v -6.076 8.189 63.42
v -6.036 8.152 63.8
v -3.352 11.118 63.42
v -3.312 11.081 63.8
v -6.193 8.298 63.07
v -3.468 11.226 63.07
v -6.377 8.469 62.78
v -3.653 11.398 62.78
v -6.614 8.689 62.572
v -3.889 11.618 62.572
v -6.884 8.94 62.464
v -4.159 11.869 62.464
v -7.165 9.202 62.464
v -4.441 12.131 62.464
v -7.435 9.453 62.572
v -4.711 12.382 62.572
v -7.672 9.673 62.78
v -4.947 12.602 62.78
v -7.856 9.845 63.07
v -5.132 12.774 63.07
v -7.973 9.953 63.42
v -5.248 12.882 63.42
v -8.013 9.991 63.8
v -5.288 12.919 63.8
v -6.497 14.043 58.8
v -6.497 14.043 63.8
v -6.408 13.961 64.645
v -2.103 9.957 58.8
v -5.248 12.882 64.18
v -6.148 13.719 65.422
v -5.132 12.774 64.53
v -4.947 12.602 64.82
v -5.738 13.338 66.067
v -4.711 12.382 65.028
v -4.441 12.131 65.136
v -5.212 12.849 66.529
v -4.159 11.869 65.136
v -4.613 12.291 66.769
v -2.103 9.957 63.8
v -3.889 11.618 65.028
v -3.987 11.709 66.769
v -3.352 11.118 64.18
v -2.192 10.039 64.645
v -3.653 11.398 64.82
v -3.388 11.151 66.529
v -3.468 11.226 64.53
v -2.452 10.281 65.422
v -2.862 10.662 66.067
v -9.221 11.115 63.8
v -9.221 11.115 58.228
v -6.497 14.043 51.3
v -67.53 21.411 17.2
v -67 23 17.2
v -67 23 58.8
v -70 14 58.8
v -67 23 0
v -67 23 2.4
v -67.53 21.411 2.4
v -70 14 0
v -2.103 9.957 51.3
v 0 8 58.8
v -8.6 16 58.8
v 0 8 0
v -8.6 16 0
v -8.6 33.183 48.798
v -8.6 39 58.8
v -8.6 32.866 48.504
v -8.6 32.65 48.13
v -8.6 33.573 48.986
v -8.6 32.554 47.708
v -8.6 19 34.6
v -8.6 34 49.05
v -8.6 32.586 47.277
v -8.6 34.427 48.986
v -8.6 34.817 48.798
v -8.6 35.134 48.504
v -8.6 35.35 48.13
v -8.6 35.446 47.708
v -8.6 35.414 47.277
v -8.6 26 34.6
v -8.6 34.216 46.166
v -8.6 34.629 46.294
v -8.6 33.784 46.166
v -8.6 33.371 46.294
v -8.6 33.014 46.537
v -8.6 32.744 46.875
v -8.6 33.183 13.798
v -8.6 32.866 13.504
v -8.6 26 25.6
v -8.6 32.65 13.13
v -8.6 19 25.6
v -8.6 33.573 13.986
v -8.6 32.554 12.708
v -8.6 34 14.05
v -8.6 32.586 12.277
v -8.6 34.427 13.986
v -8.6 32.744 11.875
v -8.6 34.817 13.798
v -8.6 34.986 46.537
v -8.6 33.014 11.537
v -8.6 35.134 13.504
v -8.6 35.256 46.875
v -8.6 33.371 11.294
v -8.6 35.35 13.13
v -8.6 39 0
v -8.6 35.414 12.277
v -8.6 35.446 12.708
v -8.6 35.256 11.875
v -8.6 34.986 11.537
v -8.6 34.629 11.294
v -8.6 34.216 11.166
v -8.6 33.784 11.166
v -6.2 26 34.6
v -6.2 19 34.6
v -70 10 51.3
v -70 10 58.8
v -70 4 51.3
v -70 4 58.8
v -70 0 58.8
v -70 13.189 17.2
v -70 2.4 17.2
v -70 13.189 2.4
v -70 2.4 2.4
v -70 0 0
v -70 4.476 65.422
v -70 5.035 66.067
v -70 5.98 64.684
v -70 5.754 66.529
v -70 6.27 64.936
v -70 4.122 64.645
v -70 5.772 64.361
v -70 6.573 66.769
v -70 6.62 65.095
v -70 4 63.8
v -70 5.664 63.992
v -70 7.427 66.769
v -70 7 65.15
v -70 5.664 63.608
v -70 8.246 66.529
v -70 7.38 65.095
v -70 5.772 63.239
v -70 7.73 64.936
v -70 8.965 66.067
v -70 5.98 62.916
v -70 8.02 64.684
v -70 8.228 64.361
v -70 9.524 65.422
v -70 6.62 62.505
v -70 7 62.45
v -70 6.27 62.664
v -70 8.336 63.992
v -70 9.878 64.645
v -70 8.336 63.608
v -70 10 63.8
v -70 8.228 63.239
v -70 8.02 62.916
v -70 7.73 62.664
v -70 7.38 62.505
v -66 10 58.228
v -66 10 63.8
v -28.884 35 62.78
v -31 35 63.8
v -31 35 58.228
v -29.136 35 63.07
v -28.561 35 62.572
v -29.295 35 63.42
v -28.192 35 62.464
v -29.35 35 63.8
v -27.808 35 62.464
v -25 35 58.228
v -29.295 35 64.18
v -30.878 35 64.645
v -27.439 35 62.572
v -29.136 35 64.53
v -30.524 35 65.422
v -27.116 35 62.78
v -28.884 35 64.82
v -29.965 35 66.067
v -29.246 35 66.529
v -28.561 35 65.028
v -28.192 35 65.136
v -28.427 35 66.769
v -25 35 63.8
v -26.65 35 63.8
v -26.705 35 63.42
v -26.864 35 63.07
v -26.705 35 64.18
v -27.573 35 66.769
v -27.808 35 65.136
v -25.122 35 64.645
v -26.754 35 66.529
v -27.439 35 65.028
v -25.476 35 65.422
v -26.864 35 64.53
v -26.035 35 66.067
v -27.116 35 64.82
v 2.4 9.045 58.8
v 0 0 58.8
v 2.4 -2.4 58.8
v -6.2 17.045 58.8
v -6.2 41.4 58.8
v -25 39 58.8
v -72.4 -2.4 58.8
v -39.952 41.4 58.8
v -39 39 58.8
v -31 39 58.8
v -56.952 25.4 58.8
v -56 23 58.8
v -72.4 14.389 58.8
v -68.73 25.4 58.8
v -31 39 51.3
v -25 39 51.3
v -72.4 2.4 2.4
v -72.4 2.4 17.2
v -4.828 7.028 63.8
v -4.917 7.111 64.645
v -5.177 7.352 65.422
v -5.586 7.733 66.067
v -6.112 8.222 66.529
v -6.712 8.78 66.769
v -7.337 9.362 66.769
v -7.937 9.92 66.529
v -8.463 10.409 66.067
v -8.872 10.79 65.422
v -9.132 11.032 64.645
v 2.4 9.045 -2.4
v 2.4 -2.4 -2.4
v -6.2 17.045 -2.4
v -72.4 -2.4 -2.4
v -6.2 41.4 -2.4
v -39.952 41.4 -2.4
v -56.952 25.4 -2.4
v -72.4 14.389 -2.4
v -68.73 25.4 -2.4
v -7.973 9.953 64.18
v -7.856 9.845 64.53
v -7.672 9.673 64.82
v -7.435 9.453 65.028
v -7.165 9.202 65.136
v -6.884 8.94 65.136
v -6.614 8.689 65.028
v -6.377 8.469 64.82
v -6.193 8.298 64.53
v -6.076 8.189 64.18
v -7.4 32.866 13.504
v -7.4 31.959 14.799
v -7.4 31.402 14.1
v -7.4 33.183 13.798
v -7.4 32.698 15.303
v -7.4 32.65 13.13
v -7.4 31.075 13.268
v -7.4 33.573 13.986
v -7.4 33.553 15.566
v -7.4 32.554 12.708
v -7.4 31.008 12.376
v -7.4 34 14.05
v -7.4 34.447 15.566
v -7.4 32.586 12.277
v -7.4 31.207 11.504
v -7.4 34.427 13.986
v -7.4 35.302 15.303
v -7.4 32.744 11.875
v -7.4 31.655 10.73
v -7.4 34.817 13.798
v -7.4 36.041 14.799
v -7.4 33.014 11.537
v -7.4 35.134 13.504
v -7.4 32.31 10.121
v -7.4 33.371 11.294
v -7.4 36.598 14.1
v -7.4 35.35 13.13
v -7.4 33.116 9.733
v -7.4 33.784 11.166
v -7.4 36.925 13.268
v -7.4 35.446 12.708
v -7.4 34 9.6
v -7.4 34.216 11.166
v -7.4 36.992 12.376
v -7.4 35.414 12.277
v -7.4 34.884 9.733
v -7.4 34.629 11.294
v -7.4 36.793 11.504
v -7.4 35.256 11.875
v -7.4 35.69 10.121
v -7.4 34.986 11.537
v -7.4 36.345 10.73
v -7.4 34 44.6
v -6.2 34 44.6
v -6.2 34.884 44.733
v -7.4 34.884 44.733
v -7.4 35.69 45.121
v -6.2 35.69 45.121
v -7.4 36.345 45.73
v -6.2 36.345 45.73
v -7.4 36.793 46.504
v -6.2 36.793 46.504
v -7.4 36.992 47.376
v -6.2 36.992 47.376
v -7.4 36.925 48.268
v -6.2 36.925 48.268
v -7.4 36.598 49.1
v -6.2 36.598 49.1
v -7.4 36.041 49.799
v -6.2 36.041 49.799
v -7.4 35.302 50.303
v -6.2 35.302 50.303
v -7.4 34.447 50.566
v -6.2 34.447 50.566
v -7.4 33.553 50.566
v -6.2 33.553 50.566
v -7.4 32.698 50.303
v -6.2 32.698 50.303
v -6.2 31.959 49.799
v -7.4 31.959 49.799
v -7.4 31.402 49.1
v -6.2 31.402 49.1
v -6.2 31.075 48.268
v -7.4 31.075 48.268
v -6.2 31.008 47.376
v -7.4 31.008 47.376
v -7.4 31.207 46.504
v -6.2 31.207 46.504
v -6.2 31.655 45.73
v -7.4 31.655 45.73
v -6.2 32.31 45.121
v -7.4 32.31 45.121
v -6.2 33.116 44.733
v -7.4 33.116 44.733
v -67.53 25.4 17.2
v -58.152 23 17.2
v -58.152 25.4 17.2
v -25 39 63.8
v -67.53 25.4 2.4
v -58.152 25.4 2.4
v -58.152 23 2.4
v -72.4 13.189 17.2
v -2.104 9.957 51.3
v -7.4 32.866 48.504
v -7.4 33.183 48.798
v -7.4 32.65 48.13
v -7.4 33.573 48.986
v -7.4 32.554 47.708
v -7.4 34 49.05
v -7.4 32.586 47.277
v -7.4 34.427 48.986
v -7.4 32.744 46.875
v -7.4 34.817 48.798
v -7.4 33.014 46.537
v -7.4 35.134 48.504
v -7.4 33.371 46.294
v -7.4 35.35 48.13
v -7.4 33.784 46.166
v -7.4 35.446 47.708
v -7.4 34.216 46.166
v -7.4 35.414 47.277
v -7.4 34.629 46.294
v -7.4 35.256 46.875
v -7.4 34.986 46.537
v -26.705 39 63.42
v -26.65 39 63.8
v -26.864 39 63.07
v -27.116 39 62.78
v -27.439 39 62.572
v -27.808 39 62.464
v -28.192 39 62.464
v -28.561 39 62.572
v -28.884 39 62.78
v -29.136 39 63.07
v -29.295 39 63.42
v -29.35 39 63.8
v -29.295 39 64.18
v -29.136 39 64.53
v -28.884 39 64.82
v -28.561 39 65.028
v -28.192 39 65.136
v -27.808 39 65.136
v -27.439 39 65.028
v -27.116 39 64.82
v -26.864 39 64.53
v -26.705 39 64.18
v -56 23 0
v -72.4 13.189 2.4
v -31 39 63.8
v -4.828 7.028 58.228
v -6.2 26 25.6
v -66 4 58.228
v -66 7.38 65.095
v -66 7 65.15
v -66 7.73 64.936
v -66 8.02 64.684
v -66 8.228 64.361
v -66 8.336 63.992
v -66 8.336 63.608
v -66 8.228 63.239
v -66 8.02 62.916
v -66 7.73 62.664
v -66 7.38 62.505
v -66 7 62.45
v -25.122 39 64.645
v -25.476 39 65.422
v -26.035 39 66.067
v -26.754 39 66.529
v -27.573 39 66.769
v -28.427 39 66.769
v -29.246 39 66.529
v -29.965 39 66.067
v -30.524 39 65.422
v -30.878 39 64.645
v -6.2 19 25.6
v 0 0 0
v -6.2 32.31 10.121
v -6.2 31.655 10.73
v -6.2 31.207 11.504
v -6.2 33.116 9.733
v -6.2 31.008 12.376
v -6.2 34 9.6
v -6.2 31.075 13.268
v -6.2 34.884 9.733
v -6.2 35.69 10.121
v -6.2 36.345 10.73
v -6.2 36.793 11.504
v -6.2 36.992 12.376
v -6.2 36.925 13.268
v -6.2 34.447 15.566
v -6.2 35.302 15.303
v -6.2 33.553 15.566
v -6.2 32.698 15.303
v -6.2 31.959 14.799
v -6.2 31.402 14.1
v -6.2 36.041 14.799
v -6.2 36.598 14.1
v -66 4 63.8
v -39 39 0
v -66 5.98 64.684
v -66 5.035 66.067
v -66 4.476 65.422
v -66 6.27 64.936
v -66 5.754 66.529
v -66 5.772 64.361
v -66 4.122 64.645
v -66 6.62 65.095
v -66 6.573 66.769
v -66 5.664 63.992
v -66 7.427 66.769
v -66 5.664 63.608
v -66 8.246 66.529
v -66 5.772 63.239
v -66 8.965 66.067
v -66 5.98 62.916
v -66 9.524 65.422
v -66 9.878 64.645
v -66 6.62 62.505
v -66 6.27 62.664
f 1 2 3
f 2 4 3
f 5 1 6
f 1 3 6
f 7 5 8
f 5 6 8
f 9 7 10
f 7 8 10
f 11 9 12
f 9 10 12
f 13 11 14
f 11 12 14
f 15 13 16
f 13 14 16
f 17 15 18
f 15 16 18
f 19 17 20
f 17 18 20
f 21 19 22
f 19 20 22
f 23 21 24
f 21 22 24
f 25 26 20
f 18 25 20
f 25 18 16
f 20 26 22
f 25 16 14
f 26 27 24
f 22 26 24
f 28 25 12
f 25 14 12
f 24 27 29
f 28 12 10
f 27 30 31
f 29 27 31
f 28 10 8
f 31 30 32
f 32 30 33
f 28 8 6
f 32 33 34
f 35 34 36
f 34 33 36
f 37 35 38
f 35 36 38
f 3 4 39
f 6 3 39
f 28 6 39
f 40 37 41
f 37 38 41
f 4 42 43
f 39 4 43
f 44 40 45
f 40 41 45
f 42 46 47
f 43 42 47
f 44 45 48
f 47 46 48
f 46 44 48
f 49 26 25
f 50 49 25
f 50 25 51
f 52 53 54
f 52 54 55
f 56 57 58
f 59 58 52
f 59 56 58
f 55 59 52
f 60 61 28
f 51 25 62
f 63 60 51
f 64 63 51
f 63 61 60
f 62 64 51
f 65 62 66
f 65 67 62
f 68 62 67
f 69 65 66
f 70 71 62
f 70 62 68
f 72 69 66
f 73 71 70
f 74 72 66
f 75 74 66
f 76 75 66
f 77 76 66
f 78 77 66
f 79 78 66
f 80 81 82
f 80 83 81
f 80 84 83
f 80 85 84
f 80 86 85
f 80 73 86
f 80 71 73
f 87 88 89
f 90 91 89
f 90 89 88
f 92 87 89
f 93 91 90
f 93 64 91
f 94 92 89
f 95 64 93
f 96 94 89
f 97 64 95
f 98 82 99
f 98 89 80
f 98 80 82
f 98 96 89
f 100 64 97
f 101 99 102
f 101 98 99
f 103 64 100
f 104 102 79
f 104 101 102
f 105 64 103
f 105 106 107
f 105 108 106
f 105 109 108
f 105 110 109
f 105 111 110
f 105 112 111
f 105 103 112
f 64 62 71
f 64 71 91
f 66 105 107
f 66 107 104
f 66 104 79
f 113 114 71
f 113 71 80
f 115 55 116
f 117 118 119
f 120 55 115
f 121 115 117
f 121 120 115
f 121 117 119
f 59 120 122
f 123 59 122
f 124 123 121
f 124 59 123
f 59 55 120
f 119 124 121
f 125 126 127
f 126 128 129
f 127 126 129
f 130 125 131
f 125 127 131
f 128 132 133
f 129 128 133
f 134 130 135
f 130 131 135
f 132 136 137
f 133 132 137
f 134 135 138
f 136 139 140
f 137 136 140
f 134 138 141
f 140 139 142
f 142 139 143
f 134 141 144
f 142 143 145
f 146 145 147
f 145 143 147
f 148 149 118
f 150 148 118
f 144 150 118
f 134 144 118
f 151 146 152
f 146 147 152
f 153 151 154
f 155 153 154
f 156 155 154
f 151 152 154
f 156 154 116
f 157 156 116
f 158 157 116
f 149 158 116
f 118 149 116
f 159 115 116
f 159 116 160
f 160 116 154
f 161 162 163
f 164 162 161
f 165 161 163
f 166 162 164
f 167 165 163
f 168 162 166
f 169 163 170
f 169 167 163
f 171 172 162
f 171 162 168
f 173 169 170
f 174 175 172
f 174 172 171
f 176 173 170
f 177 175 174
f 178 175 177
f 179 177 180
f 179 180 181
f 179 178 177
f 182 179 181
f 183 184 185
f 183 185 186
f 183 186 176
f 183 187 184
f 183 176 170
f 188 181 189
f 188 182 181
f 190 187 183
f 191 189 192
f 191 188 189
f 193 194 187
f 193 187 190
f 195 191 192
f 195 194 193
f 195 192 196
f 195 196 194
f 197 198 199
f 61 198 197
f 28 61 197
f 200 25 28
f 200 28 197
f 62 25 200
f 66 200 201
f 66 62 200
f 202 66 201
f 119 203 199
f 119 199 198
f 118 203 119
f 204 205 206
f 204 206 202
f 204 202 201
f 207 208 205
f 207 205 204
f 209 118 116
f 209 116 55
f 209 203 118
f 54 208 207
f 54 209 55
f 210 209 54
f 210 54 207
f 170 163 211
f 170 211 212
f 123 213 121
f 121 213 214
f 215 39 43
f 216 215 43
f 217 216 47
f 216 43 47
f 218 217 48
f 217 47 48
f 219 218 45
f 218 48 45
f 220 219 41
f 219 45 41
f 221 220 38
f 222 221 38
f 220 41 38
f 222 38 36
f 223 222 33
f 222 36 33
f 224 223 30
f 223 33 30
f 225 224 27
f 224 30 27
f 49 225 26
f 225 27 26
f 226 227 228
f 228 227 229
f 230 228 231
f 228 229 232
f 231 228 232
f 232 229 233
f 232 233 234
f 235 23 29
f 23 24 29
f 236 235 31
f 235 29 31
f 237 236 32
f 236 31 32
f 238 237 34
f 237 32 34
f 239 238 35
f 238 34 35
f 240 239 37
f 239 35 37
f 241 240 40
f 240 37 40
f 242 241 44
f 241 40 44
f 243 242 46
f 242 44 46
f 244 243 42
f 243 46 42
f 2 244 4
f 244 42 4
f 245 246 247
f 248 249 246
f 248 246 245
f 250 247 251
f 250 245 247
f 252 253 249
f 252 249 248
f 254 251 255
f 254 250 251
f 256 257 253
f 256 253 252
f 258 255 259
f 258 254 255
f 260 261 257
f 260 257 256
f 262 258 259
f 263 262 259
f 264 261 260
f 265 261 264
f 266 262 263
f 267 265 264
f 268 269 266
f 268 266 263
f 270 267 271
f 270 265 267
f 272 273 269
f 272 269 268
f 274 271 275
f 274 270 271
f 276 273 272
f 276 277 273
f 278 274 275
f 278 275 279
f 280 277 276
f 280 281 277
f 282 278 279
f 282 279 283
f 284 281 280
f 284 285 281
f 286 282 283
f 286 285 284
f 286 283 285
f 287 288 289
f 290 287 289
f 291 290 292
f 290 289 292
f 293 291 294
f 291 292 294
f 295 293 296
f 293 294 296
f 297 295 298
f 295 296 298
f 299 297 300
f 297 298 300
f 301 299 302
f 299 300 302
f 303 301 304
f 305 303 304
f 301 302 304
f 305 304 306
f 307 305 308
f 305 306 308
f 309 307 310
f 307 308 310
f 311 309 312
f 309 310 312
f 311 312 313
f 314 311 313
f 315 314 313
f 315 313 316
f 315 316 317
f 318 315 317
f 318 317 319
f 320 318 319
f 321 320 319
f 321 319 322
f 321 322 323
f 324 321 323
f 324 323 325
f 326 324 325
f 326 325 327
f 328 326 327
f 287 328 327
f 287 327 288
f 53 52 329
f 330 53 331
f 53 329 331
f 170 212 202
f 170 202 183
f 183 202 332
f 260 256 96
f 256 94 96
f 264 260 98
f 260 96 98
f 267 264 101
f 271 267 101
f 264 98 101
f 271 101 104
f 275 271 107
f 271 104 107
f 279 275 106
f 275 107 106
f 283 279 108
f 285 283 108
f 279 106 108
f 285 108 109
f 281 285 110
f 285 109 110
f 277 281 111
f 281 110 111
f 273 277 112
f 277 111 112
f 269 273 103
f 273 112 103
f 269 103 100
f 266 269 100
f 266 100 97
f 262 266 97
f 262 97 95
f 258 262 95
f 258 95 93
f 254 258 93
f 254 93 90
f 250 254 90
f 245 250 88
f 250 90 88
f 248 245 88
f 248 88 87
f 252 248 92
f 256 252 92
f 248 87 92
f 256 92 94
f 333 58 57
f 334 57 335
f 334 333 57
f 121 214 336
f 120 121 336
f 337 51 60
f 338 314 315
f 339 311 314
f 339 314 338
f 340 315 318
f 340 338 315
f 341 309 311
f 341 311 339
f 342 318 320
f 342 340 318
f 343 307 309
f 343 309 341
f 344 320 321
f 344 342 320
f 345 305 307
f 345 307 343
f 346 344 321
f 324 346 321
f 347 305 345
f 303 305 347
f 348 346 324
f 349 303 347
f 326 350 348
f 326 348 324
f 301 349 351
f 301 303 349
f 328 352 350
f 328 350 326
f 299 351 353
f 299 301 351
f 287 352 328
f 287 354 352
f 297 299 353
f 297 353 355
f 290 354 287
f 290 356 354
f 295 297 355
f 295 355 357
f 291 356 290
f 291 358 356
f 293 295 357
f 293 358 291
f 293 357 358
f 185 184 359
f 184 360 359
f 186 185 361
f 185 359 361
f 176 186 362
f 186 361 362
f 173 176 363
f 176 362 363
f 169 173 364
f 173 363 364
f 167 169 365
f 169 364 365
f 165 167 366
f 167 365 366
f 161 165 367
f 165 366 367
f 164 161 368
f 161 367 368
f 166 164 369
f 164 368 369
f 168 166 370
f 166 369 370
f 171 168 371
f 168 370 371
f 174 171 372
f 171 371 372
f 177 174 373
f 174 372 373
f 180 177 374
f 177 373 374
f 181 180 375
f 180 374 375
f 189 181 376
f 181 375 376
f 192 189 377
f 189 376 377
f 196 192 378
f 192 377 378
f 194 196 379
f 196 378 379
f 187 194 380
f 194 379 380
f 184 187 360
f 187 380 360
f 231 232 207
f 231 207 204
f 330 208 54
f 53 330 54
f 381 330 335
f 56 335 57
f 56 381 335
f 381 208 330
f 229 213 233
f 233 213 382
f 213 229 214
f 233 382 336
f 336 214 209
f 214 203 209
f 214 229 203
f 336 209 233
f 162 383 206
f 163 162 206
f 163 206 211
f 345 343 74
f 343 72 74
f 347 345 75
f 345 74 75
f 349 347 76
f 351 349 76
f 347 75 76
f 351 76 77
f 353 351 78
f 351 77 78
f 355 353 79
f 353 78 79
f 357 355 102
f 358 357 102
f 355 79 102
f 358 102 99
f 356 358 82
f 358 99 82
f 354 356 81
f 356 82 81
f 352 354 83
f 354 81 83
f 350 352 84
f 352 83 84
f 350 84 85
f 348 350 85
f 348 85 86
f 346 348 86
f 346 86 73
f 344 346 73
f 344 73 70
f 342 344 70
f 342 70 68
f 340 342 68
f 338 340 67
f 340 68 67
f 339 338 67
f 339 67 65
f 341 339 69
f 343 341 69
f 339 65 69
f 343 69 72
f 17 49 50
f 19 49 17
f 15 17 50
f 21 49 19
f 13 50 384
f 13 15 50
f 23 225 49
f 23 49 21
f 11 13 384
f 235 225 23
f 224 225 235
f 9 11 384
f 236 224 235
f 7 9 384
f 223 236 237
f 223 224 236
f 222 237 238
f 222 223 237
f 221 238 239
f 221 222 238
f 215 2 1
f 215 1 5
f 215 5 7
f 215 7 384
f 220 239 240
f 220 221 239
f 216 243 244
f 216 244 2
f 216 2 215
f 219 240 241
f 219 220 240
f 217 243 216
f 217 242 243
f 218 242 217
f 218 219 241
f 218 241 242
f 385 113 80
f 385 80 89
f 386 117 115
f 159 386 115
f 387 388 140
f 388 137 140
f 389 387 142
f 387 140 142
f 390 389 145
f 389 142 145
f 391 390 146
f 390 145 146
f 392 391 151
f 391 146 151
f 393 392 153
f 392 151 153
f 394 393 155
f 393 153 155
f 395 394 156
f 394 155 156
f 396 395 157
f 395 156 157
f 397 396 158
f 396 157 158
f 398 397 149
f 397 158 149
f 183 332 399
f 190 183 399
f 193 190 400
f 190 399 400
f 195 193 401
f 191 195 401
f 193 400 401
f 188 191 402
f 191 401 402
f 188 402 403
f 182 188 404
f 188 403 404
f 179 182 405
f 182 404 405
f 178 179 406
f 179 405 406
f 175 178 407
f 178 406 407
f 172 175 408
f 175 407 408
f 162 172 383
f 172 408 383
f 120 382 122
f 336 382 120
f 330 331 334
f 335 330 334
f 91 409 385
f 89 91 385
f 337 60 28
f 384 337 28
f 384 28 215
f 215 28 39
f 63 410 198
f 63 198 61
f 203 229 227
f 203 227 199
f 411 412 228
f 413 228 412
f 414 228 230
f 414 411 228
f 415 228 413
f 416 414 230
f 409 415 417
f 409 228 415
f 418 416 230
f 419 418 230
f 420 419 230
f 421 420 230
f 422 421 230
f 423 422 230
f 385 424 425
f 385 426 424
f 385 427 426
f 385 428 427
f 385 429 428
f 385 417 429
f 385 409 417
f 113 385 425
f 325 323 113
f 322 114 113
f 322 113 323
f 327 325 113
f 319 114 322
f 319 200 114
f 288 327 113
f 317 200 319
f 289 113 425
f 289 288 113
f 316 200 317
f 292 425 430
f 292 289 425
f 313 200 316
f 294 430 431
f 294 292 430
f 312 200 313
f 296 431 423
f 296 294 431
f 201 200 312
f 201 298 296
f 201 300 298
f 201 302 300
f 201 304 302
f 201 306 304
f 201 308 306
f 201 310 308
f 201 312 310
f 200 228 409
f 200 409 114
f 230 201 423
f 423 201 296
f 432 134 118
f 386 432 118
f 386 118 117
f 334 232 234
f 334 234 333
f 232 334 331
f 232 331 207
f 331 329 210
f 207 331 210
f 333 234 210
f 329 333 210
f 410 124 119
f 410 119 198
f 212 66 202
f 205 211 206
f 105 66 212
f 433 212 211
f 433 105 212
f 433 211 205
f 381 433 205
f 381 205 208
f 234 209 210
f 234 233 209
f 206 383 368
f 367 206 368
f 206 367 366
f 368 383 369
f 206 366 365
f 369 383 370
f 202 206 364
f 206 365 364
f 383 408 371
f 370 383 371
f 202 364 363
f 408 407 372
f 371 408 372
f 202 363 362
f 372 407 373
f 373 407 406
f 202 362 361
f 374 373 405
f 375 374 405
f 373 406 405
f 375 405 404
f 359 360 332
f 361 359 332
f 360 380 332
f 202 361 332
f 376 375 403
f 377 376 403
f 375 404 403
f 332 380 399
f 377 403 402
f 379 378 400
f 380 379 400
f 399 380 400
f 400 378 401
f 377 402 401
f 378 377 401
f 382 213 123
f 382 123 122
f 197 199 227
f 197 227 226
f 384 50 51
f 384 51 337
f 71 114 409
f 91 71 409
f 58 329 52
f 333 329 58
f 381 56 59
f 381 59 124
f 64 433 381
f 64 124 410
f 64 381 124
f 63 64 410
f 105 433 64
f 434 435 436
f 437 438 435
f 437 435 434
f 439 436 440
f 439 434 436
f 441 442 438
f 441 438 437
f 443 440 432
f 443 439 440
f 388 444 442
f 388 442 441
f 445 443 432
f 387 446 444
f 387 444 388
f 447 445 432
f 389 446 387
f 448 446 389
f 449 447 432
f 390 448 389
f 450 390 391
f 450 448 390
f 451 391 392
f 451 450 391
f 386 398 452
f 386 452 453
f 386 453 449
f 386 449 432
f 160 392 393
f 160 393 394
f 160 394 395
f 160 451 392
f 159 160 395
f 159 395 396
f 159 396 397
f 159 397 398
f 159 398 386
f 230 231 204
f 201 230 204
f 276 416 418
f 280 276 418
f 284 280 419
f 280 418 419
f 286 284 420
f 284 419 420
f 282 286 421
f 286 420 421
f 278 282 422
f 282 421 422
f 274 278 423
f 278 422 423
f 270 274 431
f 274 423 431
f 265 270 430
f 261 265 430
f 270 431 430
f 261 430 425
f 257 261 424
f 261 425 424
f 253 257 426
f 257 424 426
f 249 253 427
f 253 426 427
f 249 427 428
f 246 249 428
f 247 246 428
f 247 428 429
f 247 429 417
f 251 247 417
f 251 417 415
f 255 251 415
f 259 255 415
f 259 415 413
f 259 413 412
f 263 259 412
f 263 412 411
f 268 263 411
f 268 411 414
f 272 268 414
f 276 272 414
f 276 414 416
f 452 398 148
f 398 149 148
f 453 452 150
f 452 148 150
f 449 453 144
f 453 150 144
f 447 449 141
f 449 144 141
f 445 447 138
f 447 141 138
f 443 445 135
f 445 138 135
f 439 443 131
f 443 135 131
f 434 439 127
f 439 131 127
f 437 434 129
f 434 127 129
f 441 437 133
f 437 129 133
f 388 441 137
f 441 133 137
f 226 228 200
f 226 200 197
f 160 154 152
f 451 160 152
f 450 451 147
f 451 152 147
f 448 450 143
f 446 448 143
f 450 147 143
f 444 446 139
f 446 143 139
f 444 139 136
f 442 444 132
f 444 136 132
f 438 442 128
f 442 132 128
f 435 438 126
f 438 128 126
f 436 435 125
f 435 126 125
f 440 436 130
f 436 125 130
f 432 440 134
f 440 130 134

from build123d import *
from OCP.BRepFilletAPI import BRepFilletAPI_MakeChamfer

# Parameters (mm, degrees)
BOSS_EXTRUDE1_DEPTH                                = 104
SHELL1_START                                       = -8.6
SHELL1_OUTLINE_W                                   = 16
SHELL1_OUTLINE_H                                   = 108.8
SHELL1_DEPTH                                       = 2.4
SHELL1_START_2                                     = -56.951785259
SHELL1_2_OUTLINE_W                                 = 43.8
SHELL1_2_OUTLINE_H                                 = 108.8
SHELL1_2_DEPTH                                     = 50.751785259
SHELL1_START_3                                     = -72.4
SHELL1_3_OUTLINE_W                                 = 27.8
SHELL1_3_OUTLINE_H                                 = 108.8
SHELL1_3_DEPTH                                     = 74.8
SHELL1_4_DEPTH                                     = 104
SHELL1_START_4                                     = -2.4
SHELL1_5_DEPTH                                     = 108.8
SPLIT1_SURFACE_1_BACK                              = 140.108
SPLIT1_SURFACE_1_DEPTH                             = 280.216
SPLIT1_SURFACE_2_BACK                              = 140.108
SPLIT1_SURFACE_2_DEPTH                             = 280.216
BOSS_EXTRUDE2_DEPTH                                = 4
BOSS_EXTRUDE3_DEPTH                                = 4
BOSS_EXTRUDE4_DEPTH                                = 4
CHAMFER1_SIZE                                      = 4
CHAMFER1_SIZE_2                                    = 6.92820323
CBORE_START                                        = 6.157493905
CBORE_FOR_M2_5_PAN_HEAD_MACHINE_SCRE_2_R           = 3
CBORE_FOR_M2_5_PAN_HEAD_MACHINE_SCREW1_4_DEPTH     = 2.1
CBORE_START_2                                      = 5.857493905
CBORE_FOR_M2_5_PAN_HEAD_MACHINE_SCRE_3_R           = 1.35
CBORE_FOR_M2_5_PAN_HEAD_MACHINE_SCREW1_5_DEPTH     = 0.3
CBORE_START_3                                      = 39.3
CBORE_FOR_M2_5_PAN_HEAD_MACHINE_SCRE_4_R           = 3
CBORE_FOR_M2_5_PAN_HEAD_MACHINE_SCREW1_6_DEPTH     = 2.1
CBORE_START_4                                      = 38
CBORE_FOR_M2_5_PAN_HEAD_MACHINE_SCRE_5_R           = 1.35
CBORE_FOR_M2_5_PAN_HEAD_MACHINE_SCREW1_7_DEPTH     = 1.3
CBORE_START_5                                      = -72.4
CBORE_FOR_M2_5_PAN_HEAD_MACHINE_SCRE_6_R           = 3
CBORE_FOR_M2_5_PAN_HEAD_MACHINE_SCREW1_8_DEPTH     = 2.1
CBORE_START_6                                      = -70.3
CBORE_FOR_M2_5_PAN_HEAD_MACHINE_SCRE_7_R           = 1.35
CBORE_FOR_M2_5_PAN_HEAD_MACHINE_SCREW1_9_DEPTH     = 0.3
CUT_EXTRUDE1_REACH                                 = 104.356
SKETCH12_W                                         = 9.37803524
SKETCH12_H                                         = 14.8
CUT_EXTRUDE2_REACH                                 = 110.495
SKETCH13_W                                         = 14.8
SKETCH13_H                                         = 10.789494281
CUT_EXTRUDE3_REACH                                 = 104.755
SKETCH14_W                                         = 9
SKETCH14_H                                         = 7
CBORE_FOR_M2_5_PAN_HEAD_MACHINE_SCREW2_D           = 2.9
CBORE_FOR_M2_5_PAN_HEAD_MACHINE_SCREW2_DEPTH       = 10
CBORE_FOR_M2_5_PAN_HEAD_MACHINE_SCREW2_CBORE_D     = 6
CBORE_FOR_M2_5_PAN_HEAD_MACHINE_SCREW2_CBORE_DEPTH = 1.2


with BuildPart() as part:
    # Sketch1 → Boss-Extrude1 (new body)
    with BuildSketch(Plane.XY):
        Polygon((-39, 39), (-56, 23), (-67, 23), (-70, 14.000026796), (-70, 0), (0, 0), (0, 8), (-8.6, 16), (-8.6, 39), align=None)
    extrude(amount=BOSS_EXTRUDE1_DEPTH)

    # Shell1: read off the stored shape, not the designer's step
    # Shell1 outline → Shell1 (add)
    with BuildSketch(Plane.YZ.offset(SHELL1_START)):
        with Locations((33.4, 52)):
            Rectangle(SHELL1_OUTLINE_W, SHELL1_OUTLINE_H)
    extrude(amount=SHELL1_DEPTH)

    # Shell1 2 outline → Shell1 2 (add)
    with BuildSketch(Plane.YZ.offset(SHELL1_START_2)):
        with Locations((19.5, 52)):
            Rectangle(SHELL1_2_OUTLINE_W, SHELL1_2_OUTLINE_H)
    extrude(amount=SHELL1_2_DEPTH)

    # Shell1 3 outline → Shell1 3 (add)
    with BuildSketch(Plane.YZ.offset(SHELL1_START_3)):
        with Locations((11.5, 52)):
            Rectangle(SHELL1_3_OUTLINE_W, SHELL1_3_OUTLINE_H)
    extrude(amount=SHELL1_3_DEPTH)

    # Shell1 4 outline → Shell1 4 (cut)
    with BuildSketch(Plane.XY):
        Polygon((-6.2, 25.4), (-6.2, 17.045294183), (2.4, 9.045294183), (2.4, 25.4), align=None)
        Polygon((-72.4, 14.389494281), (-68.729820499, 25.4), (-72.4, 25.4), align=None)
        Polygon((-56.951785259, 25.4), (-39.951785259, 41.4), (-56.951785259, 41.4), align=None)
        Polygon((0, 0), (0, 8), (-8.6, 16), (-8.6, 39), (-39, 39), (-56, 23), (-67, 23), (-70, 14.000026796), (-70, 0), align=None)
    extrude(amount=SHELL1_4_DEPTH, mode=Mode.SUBTRACT)

    # Shell1 5 outline → Shell1 5 (cut)
    with BuildSketch(Plane.XY.offset(SHELL1_START_4)):
        Polygon((-6.2, 25.4), (-6.2, 17.045294183), (2.4, 9.045294183), (2.4, 25.4), align=None)
        Polygon((-72.4, 14.389494281), (-68.729820499, 25.4), (-72.4, 25.4), align=None)
        Polygon((-56.951785259, 25.4), (-39.951785259, 41.4), (-56.951785259, 41.4), align=None)
    extrude(amount=SHELL1_5_DEPTH, mode=Mode.SUBTRACT)


with BuildPart() as body_2:
    # Split1: the piece behind the surface
    add(part.part)
    # Split1 surface: a surface, the sketch's curves swept straight by 280.216 mm
    with BuildLine(Plane(origin=(0, 0, 0), x_dir=(0, 0, -1), z_dir=(1, 0, 0)).offset(-SPLIT1_SURFACE_1_BACK), mode=Mode.PRIVATE) as split1_surface_1_path:
        Line((-58.8, -2.4), (-58.8, 41.4))
    split1_surface_1 = Shell.extrude(split1_surface_1_path.wire(), (1 * SPLIT1_SURFACE_1_DEPTH, 0 * SPLIT1_SURFACE_1_DEPTH, 0 * SPLIT1_SURFACE_1_DEPTH))
    split(bisect_by=split1_surface_1, keep=Keep.BOTTOM)

    # Sketch3 → Boss-Extrude2 (add)
    with BuildSketch(Plane(origin=(3.989562192, 4.288779356, 0), x_dir=(0.7321867381630838, -0.6811039424772873, 0), z_dir=(-0.6811039424772873, -0.7321867381630838, 0))):
        with BuildLine():
            Line((-14.321650284, 51.3), (-8.321650284, 51.3))
            Line((-8.321650284, 51.3), (-8.321650284, 63.8))
            ThreePointArc((-8.321650284, 63.8), (-11.321650284, 66.8), (-14.321650284, 63.8))
            Line((-14.321650284, 63.8), (-14.321650284, 51.3))
        make_face()
    extrude(amount=BOSS_EXTRUDE2_DEPTH)

    # Sketch4 → Boss-Extrude3 (add)
    with BuildSketch(Plane.XZ.offset(-39)):
        with BuildLine():
            Line((-31, 51.3), (-25, 51.3))
            Line((-25, 51.3), (-25, 63.8))
            ThreePointArc((-25, 63.8), (-28, 66.8), (-31, 63.8))
            Line((-31, 63.8), (-31, 51.3))
        make_face()
    extrude(amount=BOSS_EXTRUDE3_DEPTH)

    # Sketch5 → Boss-Extrude4 (add)
    with BuildSketch(Plane(origin=(-70, 0, 0), x_dir=(0, 0, -1), z_dir=(1, 0, 0))):
        with BuildLine():
            Line((-51.3, 10.000013398), (-63.8, 10.000013398))
            ThreePointArc((-63.8, 10.000013398), (-66.8, 7.000013398), (-63.8, 4.000013398))
            Line((-63.8, 4.000013398), (-51.3, 4.000013398))
            Line((-51.3, 4.000013398), (-51.3, 10.000013398))
        make_face()
    extrude(amount=BOSS_EXTRUDE4_DEPTH)

    # Chamfer1
    chamfer1_edges_1 = [body_2.edges().sort_by_distance(p)[0] for p in [
        (-7.02441577, 9.071253047, 51.3),
    ]]
    chamfer1_side_1 = [body_2.faces().sort_by_distance(p)[0] for p in [
        (-6.969927455, 9.129827986, 51.3),
    ]]
    chamfer1_edges_2 = [body_2.edges().sort_by_distance(p)[0] for p in [
        (-28, 35, 51.3),
    ]]
    chamfer1_side_2 = [body_2.faces().sort_by_distance(p)[0] for p in [
        (-28, 35.08, 51.3),
    ]]
    chamfer1_edges_3 = [body_2.edges().sort_by_distance(p)[0] for p in [
        (-66, 7.000013398, 51.3),
    ]]
    chamfer1_side_3 = [body_2.faces().sort_by_distance(p)[0] for p in [
        (-66.08, 7.000013398, 51.3),
    ]]
    chamfer1 = BRepFilletAPI_MakeChamfer(body_2.part.solid().wrapped)
    for e in chamfer1_edges_1:
        chamfer1.Add(CHAMFER1_SIZE - 0.0001, CHAMFER1_SIZE_2 - 0.0001, e.wrapped, chamfer1_side_1[0].wrapped)
    for e in chamfer1_edges_2:
        chamfer1.Add(CHAMFER1_SIZE - 0.0001, CHAMFER1_SIZE_2 - 0.0001, e.wrapped, chamfer1_side_2[0].wrapped)
    for e in chamfer1_edges_3:
        chamfer1.Add(CHAMFER1_SIZE - 0.0001, CHAMFER1_SIZE_2 - 0.0001, e.wrapped, chamfer1_side_3[0].wrapped)
    add(Compound.cast(chamfer1.Shape()), mode=Mode.REPLACE)  # a hair under: the kernel refuses the full size

    # CBORE for M2.5 Pan Head Machine Screw1: read off the stored shape, not the designer's step
    # CBORE for M2.5 Pan Head Machine Screw1: loft between two sections, ruled curve by curve
    cbore_for_m2_5_pan_head_machine_screw1_from = [
        Edge.make_three_point_arc((-8.012867866, 9.99074337, 63.8), (-7.02441577, 9.071253047, 65.15), (-6.035963673, 8.151762725, 63.8)),
        Edge.make_three_point_arc((-6.035963673, 8.151762725, 63.8), (-7.02441577, 9.071253047, 62.45), (-8.012867866, 9.99074337, 63.8)),
    ]
    cbore_for_m2_5_pan_head_machine_screw1_to = [
        Edge.make_three_point_arc((-5.288452097, 12.919490322, 63.8), (-4.3, 12, 65.15), (-3.311547903, 11.080509678, 63.8)),
        Edge.make_three_point_arc((-3.311547903, 11.080509678, 63.8), (-4.3, 12, 62.45), (-5.288452097, 12.919490322, 63.8)),
    ]
    cbore_for_m2_5_pan_head_machine_screw1 = Solid(Shell([*[Face.make_surface_from_curves(cbore_for_m2_5_pan_head_machine_screw1_from[k], cbore_for_m2_5_pan_head_machine_screw1_to[k]) for k in range(2)], Face(Wire(cbore_for_m2_5_pan_head_machine_screw1_from)), Face(Wire(cbore_for_m2_5_pan_head_machine_screw1_to))]))
    add(cbore_for_m2_5_pan_head_machine_screw1, mode=Mode.SUBTRACT)

    # CBORE for M2.5 Pan Head Machine Screw1 2: loft between two sections, ruled curve by curve
    cbore_for_m2_5_pan_head_machine_screw1_2_from = [
        Edge.make_three_point_arc((-29.35, 35, 63.8), (-28, 35, 65.15), (-26.65, 35, 63.8)),
        Edge.make_three_point_arc((-26.65, 35, 63.8), (-28, 35, 62.45), (-29.35, 35, 63.8)),
    ]
    cbore_for_m2_5_pan_head_machine_screw1_2_to = [
        Edge.make_three_point_arc((-29.35, 39, 63.8), (-28, 39, 65.15), (-26.65, 39, 63.8)),
        Edge.make_three_point_arc((-26.65, 39, 63.8), (-28, 39, 62.45), (-29.35, 39, 63.8)),
    ]
    cbore_for_m2_5_pan_head_machine_screw1_2 = Solid(Shell([*[Face.make_surface_from_curves(cbore_for_m2_5_pan_head_machine_screw1_2_from[k], cbore_for_m2_5_pan_head_machine_screw1_2_to[k]) for k in range(2)], Face(Wire(cbore_for_m2_5_pan_head_machine_screw1_2_from)), Face(Wire(cbore_for_m2_5_pan_head_machine_screw1_2_to))]))
    add(cbore_for_m2_5_pan_head_machine_screw1_2, mode=Mode.SUBTRACT)

    # CBORE for M2.5 Pan Head Machine Screw1 3: loft between two sections, ruled curve by curve
    cbore_for_m2_5_pan_head_machine_screw1_3_from = [
        Edge.make_three_point_arc((-66, 7.000013398, 65.15), (-66, 8.350013398, 63.8), (-66, 7.000013398, 62.45)),
        Edge.make_three_point_arc((-66, 7.000013398, 62.45), (-66, 5.650013398, 63.8), (-66, 7.000013398, 65.15)),
    ]
    cbore_for_m2_5_pan_head_machine_screw1_3_to = [
        Edge.make_three_point_arc((-70, 7.000013398, 65.15), (-70, 8.350013398, 63.8), (-70, 7.000013398, 62.45)),
        Edge.make_three_point_arc((-70, 7.000013398, 62.45), (-70, 5.650013398, 63.8), (-70, 7.000013398, 65.15)),
    ]
    cbore_for_m2_5_pan_head_machine_screw1_3 = Solid(Shell([*[Face.make_surface_from_curves(cbore_for_m2_5_pan_head_machine_screw1_3_from[k], cbore_for_m2_5_pan_head_machine_screw1_3_to[k]) for k in range(2)], Face(Wire(cbore_for_m2_5_pan_head_machine_screw1_3_from)), Face(Wire(cbore_for_m2_5_pan_head_machine_screw1_3_to))]))
    add(cbore_for_m2_5_pan_head_machine_screw1_3, mode=Mode.SUBTRACT)

    # Sketch12 → Cut-Extrude1 (cut, up to next)
    with BuildSketch(Plane(origin=(0, 25.4, 0), x_dir=(1, 0, 0), z_dir=(0, 1, 0)), mode=Mode.PRIVATE) as cut_extrude1_sk1:
        with Locations((-62.840802879, -9.8)):
            Rectangle(SKETCH12_W, SKETCH12_H)
    cut_extrude1_tool1 = extrude(cut_extrude1_sk1.sketch, amount=-CUT_EXTRUDE1_REACH, mode=Mode.PRIVATE) & body_2.part
    add(cut_extrude1_tool1.solids().sort_by_distance((-62.840803, 25.4, 9.8))[0], mode=Mode.SUBTRACT)

    # Sketch13 → Cut-Extrude2 (cut, up to next)
    with BuildSketch(Plane.ZY.offset(72.4), mode=Mode.PRIVATE) as cut_extrude2_sk1:
        with Locations((9.8, 7.794747141)):
            Rectangle(SKETCH13_W, SKETCH13_H)
    cut_extrude2_tool1 = extrude(cut_extrude2_sk1.sketch, amount=-CUT_EXTRUDE2_REACH, mode=Mode.PRIVATE) & body_2.part
    add(cut_extrude2_tool1.solids().sort_by_distance((-72.4, 7.794747, 9.8))[0], mode=Mode.SUBTRACT)

    # Sketch14 → Cut-Extrude3 (cut, up to next)
    with BuildSketch(Plane(origin=(-6.2, 0, 0), x_dir=(0, 0, -1), z_dir=(1, 0, 0)), mode=Mode.PRIVATE) as cut_extrude3_sk1:
        with Locations((-30.1, 22.5)):
            Rectangle(SKETCH14_W, SKETCH14_H)
    cut_extrude3_tool1 = extrude(cut_extrude3_sk1.sketch, amount=-CUT_EXTRUDE3_REACH, mode=Mode.PRIVATE) & body_2.part
    add(cut_extrude3_tool1.solids().sort_by_distance((-6.2, 22.5, 30.1))[0], mode=Mode.SUBTRACT)

    # CBORE for M2.5 Pan Head Machine Screw2
    with Locations(Plane(origin=(-6.2, 0, 0), x_dir=(0, 0, -1), z_dir=(1, 0, 0))):
        with Locations((-47.6, 34), (-12.6, 34)):
            CounterBoreHole(CBORE_FOR_M2_5_PAN_HEAD_MACHINE_SCREW2_D / 2, CBORE_FOR_M2_5_PAN_HEAD_MACHINE_SCREW2_CBORE_D / 2, CBORE_FOR_M2_5_PAN_HEAD_MACHINE_SCREW2_CBORE_DEPTH, depth=CBORE_FOR_M2_5_PAN_HEAD_MACHINE_SCREW2_DEPTH)


with BuildPart() as part_1:
    add(part.part)

    # Split1: split by a surface, the side it looks to stays
    # Split1 surface: a surface, the sketch's curves swept straight by 280.216 mm
    with BuildLine(Plane(origin=(0, 0, 0), x_dir=(0, 0, -1), z_dir=(1, 0, 0)).offset(-SPLIT1_SURFACE_2_BACK), mode=Mode.PRIVATE) as split1_surface_2_path:
        Line((-58.8, -2.4), (-58.8, 41.4))
    split1_surface_2 = Shell.extrude(split1_surface_2_path.wire(), (1 * SPLIT1_SURFACE_2_DEPTH, 0 * SPLIT1_SURFACE_2_DEPTH, 0 * SPLIT1_SURFACE_2_DEPTH))
    split(bisect_by=split1_surface_2, keep=Keep.TOP)

    # CBORE for M2.5 Pan Head Machine Scre 2 → CBORE for M2.5 Pan Head Machine Screw1 4 (cut)
    with BuildSketch(Plane(origin=(0, 0, 0), x_dir=(0.732186738163084, -0.681103942477287, 0), z_dir=(0.681103942477287, 0.732186738163084, 0)).offset(CBORE_START)):
        with Locations((-11.321650284, -63.8)):
            Circle(CBORE_FOR_M2_5_PAN_HEAD_MACHINE_SCRE_2_R)
    extrude(amount=CBORE_FOR_M2_5_PAN_HEAD_MACHINE_SCREW1_4_DEPTH, mode=Mode.SUBTRACT)

    # CBORE for M2.5 Pan Head Machine Scre 3 → CBORE for M2.5 Pan Head Machine Screw1 5 (cut)
    with BuildSketch(Plane(origin=(0, 0, 0), x_dir=(0.732186738163084, -0.681103942477287, 0), z_dir=(0.681103942477287, 0.732186738163084, 0)).offset(CBORE_START_2)):
        with Locations((-11.321650284, -63.8)):
            Circle(CBORE_FOR_M2_5_PAN_HEAD_MACHINE_SCRE_3_R)
    extrude(amount=CBORE_FOR_M2_5_PAN_HEAD_MACHINE_SCREW1_5_DEPTH, mode=Mode.SUBTRACT)

    # CBORE for M2.5 Pan Head Machine Scre 4 → CBORE for M2.5 Pan Head Machine Screw1 6 (cut)
    with BuildSketch(Plane(origin=(0, 0, 0), x_dir=(1, 0, 0), z_dir=(0, 1, 0)).offset(CBORE_START_3)):
        with Locations((-28, -63.8)):
            Circle(CBORE_FOR_M2_5_PAN_HEAD_MACHINE_SCRE_4_R)
    extrude(amount=CBORE_FOR_M2_5_PAN_HEAD_MACHINE_SCREW1_6_DEPTH, mode=Mode.SUBTRACT)

    # CBORE for M2.5 Pan Head Machine Scre 5 → CBORE for M2.5 Pan Head Machine Screw1 7 (cut)
    with BuildSketch(Plane(origin=(0, 0, 0), x_dir=(1, 0, 0), z_dir=(0, 1, 0)).offset(CBORE_START_4)):
        with Locations((-28, -63.8)):
            Circle(CBORE_FOR_M2_5_PAN_HEAD_MACHINE_SCRE_5_R)
    extrude(amount=CBORE_FOR_M2_5_PAN_HEAD_MACHINE_SCREW1_7_DEPTH, mode=Mode.SUBTRACT)

    # CBORE for M2.5 Pan Head Machine Scre 6 → CBORE for M2.5 Pan Head Machine Screw1 8 (cut)
    with BuildSketch(Plane.YZ.offset(CBORE_START_5)):
        with Locations((7.000013398, 63.8)):
            Circle(CBORE_FOR_M2_5_PAN_HEAD_MACHINE_SCRE_6_R)
    extrude(amount=CBORE_FOR_M2_5_PAN_HEAD_MACHINE_SCREW1_8_DEPTH, mode=Mode.SUBTRACT)

    # CBORE for M2.5 Pan Head Machine Scre 7 → CBORE for M2.5 Pan Head Machine Screw1 9 (cut)
    with BuildSketch(Plane.YZ.offset(CBORE_START_6)):
        with Locations((7.000013398, 63.8)):
            Circle(CBORE_FOR_M2_5_PAN_HEAD_MACHINE_SCRE_7_R)
    extrude(amount=CBORE_FOR_M2_5_PAN_HEAD_MACHINE_SCREW1_9_DEPTH, mode=Mode.SUBTRACT)


solid = body_2.part
